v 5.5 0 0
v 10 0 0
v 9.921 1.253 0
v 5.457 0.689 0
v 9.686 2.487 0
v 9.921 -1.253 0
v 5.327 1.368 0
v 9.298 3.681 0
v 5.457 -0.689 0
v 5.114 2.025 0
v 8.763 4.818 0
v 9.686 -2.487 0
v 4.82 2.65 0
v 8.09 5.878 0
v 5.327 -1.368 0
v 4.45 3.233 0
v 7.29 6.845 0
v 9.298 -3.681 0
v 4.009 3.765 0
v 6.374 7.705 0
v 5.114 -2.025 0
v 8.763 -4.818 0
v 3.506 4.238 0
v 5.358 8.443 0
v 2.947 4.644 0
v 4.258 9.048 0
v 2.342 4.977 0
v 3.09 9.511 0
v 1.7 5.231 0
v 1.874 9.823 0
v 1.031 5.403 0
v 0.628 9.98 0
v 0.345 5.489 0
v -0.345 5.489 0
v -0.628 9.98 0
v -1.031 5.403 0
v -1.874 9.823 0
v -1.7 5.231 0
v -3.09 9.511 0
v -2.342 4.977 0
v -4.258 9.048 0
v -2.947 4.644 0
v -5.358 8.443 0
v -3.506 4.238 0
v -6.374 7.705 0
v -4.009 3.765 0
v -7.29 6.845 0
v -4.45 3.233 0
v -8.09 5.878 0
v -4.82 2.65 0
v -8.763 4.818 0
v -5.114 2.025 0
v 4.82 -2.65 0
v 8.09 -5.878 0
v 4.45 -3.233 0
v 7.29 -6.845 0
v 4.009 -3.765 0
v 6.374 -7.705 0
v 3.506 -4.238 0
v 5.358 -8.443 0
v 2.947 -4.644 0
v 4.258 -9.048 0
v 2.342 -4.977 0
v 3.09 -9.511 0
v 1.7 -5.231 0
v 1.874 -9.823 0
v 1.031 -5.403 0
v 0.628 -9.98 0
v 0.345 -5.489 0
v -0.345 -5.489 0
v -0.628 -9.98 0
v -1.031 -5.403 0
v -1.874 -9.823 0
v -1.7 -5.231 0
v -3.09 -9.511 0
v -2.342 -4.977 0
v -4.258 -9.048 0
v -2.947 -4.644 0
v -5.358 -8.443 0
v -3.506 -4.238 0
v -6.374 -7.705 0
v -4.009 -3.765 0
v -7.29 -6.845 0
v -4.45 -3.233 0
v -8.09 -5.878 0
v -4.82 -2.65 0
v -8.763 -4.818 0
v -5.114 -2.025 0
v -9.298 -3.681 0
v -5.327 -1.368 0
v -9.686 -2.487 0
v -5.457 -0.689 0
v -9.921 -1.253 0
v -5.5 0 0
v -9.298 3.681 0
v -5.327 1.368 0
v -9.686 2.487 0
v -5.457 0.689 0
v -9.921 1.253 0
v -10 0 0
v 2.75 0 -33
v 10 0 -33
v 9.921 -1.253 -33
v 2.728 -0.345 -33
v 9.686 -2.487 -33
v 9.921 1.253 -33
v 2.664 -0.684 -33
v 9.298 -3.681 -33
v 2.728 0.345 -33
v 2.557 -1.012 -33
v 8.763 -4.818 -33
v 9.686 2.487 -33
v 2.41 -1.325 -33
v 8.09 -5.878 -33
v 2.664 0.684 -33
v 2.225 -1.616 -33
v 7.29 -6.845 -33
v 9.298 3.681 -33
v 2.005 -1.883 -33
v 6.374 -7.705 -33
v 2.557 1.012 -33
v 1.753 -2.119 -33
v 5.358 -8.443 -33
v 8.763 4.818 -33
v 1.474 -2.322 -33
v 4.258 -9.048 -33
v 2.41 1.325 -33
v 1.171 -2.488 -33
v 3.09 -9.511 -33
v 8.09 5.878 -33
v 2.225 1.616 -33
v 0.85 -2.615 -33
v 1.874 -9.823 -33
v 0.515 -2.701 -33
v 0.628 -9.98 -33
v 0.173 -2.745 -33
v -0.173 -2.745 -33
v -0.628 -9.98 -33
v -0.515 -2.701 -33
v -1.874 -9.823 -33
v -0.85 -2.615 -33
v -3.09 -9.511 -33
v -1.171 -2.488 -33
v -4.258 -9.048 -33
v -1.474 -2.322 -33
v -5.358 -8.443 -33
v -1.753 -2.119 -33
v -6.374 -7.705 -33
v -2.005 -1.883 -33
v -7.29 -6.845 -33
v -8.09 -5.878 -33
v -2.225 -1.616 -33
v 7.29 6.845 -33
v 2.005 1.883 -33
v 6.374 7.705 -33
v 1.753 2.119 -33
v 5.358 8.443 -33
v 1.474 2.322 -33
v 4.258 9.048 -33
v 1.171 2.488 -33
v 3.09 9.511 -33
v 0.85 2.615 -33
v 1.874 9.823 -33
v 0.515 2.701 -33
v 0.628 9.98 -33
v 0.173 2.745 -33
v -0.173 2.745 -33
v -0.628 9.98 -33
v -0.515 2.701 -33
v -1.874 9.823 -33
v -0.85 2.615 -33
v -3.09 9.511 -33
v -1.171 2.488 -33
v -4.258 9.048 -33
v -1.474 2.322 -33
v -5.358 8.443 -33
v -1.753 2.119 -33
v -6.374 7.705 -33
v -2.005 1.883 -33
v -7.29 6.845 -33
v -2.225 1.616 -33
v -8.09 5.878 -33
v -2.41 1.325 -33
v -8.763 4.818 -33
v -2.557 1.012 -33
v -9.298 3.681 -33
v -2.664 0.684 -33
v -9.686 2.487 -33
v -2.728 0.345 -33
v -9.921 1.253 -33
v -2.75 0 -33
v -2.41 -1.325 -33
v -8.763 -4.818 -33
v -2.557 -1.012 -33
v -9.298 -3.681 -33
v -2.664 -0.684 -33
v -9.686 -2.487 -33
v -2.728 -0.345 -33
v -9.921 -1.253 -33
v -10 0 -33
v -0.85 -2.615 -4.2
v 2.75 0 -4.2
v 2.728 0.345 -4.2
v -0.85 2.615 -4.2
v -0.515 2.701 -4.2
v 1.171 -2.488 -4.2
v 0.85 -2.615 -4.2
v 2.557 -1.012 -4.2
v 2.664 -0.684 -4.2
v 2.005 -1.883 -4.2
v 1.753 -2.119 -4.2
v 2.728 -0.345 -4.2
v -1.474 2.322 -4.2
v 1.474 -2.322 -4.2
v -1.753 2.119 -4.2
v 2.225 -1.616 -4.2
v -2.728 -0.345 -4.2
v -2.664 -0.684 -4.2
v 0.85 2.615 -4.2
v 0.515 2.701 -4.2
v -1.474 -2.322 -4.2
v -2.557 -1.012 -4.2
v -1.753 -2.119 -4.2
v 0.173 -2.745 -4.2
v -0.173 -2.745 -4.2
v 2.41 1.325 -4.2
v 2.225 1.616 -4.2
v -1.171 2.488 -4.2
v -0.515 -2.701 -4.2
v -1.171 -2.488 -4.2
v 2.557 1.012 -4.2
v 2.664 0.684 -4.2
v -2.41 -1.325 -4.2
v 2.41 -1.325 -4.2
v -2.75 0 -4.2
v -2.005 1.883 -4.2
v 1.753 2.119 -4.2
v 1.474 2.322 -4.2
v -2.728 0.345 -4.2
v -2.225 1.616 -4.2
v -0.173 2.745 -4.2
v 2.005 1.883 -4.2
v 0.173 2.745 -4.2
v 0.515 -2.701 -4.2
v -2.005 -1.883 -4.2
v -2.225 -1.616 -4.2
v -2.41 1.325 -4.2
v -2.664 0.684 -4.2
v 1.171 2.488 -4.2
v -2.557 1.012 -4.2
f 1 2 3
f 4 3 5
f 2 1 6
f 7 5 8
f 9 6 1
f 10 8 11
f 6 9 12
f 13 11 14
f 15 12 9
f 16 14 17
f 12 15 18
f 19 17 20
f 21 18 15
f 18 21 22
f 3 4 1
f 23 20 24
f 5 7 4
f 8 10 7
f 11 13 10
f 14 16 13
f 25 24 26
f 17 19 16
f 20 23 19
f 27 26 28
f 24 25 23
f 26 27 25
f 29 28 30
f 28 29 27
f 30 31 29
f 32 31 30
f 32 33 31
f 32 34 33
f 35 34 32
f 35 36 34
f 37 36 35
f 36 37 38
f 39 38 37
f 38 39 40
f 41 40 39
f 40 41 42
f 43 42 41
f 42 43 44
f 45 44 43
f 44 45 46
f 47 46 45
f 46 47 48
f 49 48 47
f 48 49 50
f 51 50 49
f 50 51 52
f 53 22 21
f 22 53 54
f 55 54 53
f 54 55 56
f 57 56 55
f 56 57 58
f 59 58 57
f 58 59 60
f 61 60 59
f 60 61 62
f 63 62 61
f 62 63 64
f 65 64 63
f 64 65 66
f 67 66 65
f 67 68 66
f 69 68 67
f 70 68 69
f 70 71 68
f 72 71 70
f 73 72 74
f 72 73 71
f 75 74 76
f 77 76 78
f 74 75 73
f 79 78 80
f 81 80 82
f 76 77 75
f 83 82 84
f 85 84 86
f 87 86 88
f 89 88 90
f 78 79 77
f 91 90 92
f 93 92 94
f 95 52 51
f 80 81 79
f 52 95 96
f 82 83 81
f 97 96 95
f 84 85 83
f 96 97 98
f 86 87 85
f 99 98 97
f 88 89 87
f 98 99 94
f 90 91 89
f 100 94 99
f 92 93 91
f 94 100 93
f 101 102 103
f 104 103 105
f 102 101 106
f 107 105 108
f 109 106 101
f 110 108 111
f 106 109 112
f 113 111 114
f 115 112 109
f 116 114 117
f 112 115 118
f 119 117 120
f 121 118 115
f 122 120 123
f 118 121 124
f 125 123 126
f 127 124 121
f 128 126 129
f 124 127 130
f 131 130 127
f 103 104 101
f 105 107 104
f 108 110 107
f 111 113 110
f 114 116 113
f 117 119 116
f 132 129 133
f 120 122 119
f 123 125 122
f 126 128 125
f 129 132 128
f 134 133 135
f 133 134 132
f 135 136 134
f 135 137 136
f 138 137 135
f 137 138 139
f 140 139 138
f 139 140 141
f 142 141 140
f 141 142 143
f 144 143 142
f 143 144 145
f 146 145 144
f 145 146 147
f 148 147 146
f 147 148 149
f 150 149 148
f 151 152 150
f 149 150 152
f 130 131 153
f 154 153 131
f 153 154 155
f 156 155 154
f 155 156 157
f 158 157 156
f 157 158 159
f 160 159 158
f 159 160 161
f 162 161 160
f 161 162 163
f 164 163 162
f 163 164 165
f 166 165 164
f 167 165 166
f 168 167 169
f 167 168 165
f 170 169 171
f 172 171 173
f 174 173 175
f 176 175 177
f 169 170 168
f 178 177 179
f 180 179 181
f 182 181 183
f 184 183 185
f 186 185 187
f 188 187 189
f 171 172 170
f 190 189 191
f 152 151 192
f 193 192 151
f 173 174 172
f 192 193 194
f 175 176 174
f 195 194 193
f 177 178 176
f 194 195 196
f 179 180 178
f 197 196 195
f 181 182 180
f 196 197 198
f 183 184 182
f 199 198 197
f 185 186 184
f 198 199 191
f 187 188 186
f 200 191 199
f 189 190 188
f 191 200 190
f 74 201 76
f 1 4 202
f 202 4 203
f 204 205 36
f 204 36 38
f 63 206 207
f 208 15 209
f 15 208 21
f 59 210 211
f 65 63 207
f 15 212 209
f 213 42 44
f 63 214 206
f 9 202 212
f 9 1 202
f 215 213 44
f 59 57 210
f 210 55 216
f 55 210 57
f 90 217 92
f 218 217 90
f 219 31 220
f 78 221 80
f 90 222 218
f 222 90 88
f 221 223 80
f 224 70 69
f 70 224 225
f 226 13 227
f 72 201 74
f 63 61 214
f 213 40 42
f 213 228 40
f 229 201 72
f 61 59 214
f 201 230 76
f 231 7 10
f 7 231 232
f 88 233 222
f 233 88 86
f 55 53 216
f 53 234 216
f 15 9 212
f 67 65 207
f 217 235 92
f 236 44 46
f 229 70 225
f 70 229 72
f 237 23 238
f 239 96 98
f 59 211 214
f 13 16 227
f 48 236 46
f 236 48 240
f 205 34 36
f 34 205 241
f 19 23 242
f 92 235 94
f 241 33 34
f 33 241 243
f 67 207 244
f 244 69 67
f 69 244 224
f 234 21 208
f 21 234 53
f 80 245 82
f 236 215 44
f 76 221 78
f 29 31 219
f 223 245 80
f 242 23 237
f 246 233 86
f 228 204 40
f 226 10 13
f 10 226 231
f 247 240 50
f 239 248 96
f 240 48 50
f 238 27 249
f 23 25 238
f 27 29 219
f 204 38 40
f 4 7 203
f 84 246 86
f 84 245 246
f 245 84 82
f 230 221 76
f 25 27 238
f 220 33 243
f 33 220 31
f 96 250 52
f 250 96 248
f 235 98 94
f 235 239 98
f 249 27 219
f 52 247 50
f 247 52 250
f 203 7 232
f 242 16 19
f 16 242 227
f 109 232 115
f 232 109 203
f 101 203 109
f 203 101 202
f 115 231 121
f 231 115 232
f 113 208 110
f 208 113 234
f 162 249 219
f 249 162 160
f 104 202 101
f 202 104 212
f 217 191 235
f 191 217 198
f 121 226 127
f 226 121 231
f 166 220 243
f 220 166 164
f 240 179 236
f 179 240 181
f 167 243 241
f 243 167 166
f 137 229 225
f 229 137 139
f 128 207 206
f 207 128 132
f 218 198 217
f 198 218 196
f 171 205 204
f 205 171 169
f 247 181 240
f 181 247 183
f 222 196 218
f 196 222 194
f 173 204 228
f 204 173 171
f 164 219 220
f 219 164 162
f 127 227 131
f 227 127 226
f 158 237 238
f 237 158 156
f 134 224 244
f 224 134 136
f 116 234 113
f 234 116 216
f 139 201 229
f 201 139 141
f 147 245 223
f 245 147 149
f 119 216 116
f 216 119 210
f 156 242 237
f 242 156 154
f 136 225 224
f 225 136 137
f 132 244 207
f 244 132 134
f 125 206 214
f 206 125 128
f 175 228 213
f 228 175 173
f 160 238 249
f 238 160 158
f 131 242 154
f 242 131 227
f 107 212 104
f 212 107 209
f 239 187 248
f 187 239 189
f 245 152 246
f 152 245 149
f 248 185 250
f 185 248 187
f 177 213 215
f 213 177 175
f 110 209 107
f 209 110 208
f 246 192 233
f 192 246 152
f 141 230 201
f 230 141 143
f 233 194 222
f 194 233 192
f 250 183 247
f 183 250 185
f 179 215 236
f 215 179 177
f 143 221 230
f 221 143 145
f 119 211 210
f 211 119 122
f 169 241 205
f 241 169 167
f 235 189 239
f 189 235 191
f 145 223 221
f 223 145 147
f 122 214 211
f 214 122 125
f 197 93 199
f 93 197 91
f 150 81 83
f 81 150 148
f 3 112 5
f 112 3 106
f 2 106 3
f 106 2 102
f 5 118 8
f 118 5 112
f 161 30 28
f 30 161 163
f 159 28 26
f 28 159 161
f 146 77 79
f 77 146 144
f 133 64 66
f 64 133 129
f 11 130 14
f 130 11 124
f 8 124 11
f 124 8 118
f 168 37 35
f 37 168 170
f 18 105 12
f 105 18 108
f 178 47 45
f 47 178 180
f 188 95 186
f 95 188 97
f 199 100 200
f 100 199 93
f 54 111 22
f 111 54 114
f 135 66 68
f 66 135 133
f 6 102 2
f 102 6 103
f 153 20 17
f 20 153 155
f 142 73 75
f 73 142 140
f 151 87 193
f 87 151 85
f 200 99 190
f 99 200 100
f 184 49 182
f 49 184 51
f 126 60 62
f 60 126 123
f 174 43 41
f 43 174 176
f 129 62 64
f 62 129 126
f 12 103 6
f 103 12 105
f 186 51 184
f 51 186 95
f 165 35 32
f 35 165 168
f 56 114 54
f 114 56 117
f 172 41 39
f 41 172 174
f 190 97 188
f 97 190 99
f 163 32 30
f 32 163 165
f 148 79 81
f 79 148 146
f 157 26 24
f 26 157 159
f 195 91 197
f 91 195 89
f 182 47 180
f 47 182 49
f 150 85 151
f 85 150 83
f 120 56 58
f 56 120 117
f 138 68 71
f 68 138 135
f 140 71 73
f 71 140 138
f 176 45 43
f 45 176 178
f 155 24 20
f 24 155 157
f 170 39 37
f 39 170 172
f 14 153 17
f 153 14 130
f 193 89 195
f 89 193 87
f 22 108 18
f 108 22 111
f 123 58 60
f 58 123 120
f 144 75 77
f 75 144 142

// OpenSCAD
$fn = 50;


difference() {
	union() {
		translate(v = [0, 0, -33.0000000000]) {
			cylinder(h = 33, r = 10.0000000000);
		}
	}
	union() {
		translate(v = [0, 0, 0]) {
			rotate(a = [0, 0, 0]) {
				difference() {
					union() {
						#translate(v = [0, 0, -33.0000000000]) {
							cylinder(h = 33, r = 2.2500000000);
						}
						#translate(v = [0, 0, -4.2000000000]) {
							cylinder(h = 4.2000000000, r1 = 2.7500000000, r2 = 5.5000000000);
						}
						#translate(v = [0, 0, -33.0000000000]) {
							cylinder(h = 33, r = 2.7500000000);
						}
						#translate(v = [0, 0, -33.0000000000]) {
							cylinder(h = 33, r = 2.2500000000);
						}
					}
					union();
				}
			}
		}
	}
}
